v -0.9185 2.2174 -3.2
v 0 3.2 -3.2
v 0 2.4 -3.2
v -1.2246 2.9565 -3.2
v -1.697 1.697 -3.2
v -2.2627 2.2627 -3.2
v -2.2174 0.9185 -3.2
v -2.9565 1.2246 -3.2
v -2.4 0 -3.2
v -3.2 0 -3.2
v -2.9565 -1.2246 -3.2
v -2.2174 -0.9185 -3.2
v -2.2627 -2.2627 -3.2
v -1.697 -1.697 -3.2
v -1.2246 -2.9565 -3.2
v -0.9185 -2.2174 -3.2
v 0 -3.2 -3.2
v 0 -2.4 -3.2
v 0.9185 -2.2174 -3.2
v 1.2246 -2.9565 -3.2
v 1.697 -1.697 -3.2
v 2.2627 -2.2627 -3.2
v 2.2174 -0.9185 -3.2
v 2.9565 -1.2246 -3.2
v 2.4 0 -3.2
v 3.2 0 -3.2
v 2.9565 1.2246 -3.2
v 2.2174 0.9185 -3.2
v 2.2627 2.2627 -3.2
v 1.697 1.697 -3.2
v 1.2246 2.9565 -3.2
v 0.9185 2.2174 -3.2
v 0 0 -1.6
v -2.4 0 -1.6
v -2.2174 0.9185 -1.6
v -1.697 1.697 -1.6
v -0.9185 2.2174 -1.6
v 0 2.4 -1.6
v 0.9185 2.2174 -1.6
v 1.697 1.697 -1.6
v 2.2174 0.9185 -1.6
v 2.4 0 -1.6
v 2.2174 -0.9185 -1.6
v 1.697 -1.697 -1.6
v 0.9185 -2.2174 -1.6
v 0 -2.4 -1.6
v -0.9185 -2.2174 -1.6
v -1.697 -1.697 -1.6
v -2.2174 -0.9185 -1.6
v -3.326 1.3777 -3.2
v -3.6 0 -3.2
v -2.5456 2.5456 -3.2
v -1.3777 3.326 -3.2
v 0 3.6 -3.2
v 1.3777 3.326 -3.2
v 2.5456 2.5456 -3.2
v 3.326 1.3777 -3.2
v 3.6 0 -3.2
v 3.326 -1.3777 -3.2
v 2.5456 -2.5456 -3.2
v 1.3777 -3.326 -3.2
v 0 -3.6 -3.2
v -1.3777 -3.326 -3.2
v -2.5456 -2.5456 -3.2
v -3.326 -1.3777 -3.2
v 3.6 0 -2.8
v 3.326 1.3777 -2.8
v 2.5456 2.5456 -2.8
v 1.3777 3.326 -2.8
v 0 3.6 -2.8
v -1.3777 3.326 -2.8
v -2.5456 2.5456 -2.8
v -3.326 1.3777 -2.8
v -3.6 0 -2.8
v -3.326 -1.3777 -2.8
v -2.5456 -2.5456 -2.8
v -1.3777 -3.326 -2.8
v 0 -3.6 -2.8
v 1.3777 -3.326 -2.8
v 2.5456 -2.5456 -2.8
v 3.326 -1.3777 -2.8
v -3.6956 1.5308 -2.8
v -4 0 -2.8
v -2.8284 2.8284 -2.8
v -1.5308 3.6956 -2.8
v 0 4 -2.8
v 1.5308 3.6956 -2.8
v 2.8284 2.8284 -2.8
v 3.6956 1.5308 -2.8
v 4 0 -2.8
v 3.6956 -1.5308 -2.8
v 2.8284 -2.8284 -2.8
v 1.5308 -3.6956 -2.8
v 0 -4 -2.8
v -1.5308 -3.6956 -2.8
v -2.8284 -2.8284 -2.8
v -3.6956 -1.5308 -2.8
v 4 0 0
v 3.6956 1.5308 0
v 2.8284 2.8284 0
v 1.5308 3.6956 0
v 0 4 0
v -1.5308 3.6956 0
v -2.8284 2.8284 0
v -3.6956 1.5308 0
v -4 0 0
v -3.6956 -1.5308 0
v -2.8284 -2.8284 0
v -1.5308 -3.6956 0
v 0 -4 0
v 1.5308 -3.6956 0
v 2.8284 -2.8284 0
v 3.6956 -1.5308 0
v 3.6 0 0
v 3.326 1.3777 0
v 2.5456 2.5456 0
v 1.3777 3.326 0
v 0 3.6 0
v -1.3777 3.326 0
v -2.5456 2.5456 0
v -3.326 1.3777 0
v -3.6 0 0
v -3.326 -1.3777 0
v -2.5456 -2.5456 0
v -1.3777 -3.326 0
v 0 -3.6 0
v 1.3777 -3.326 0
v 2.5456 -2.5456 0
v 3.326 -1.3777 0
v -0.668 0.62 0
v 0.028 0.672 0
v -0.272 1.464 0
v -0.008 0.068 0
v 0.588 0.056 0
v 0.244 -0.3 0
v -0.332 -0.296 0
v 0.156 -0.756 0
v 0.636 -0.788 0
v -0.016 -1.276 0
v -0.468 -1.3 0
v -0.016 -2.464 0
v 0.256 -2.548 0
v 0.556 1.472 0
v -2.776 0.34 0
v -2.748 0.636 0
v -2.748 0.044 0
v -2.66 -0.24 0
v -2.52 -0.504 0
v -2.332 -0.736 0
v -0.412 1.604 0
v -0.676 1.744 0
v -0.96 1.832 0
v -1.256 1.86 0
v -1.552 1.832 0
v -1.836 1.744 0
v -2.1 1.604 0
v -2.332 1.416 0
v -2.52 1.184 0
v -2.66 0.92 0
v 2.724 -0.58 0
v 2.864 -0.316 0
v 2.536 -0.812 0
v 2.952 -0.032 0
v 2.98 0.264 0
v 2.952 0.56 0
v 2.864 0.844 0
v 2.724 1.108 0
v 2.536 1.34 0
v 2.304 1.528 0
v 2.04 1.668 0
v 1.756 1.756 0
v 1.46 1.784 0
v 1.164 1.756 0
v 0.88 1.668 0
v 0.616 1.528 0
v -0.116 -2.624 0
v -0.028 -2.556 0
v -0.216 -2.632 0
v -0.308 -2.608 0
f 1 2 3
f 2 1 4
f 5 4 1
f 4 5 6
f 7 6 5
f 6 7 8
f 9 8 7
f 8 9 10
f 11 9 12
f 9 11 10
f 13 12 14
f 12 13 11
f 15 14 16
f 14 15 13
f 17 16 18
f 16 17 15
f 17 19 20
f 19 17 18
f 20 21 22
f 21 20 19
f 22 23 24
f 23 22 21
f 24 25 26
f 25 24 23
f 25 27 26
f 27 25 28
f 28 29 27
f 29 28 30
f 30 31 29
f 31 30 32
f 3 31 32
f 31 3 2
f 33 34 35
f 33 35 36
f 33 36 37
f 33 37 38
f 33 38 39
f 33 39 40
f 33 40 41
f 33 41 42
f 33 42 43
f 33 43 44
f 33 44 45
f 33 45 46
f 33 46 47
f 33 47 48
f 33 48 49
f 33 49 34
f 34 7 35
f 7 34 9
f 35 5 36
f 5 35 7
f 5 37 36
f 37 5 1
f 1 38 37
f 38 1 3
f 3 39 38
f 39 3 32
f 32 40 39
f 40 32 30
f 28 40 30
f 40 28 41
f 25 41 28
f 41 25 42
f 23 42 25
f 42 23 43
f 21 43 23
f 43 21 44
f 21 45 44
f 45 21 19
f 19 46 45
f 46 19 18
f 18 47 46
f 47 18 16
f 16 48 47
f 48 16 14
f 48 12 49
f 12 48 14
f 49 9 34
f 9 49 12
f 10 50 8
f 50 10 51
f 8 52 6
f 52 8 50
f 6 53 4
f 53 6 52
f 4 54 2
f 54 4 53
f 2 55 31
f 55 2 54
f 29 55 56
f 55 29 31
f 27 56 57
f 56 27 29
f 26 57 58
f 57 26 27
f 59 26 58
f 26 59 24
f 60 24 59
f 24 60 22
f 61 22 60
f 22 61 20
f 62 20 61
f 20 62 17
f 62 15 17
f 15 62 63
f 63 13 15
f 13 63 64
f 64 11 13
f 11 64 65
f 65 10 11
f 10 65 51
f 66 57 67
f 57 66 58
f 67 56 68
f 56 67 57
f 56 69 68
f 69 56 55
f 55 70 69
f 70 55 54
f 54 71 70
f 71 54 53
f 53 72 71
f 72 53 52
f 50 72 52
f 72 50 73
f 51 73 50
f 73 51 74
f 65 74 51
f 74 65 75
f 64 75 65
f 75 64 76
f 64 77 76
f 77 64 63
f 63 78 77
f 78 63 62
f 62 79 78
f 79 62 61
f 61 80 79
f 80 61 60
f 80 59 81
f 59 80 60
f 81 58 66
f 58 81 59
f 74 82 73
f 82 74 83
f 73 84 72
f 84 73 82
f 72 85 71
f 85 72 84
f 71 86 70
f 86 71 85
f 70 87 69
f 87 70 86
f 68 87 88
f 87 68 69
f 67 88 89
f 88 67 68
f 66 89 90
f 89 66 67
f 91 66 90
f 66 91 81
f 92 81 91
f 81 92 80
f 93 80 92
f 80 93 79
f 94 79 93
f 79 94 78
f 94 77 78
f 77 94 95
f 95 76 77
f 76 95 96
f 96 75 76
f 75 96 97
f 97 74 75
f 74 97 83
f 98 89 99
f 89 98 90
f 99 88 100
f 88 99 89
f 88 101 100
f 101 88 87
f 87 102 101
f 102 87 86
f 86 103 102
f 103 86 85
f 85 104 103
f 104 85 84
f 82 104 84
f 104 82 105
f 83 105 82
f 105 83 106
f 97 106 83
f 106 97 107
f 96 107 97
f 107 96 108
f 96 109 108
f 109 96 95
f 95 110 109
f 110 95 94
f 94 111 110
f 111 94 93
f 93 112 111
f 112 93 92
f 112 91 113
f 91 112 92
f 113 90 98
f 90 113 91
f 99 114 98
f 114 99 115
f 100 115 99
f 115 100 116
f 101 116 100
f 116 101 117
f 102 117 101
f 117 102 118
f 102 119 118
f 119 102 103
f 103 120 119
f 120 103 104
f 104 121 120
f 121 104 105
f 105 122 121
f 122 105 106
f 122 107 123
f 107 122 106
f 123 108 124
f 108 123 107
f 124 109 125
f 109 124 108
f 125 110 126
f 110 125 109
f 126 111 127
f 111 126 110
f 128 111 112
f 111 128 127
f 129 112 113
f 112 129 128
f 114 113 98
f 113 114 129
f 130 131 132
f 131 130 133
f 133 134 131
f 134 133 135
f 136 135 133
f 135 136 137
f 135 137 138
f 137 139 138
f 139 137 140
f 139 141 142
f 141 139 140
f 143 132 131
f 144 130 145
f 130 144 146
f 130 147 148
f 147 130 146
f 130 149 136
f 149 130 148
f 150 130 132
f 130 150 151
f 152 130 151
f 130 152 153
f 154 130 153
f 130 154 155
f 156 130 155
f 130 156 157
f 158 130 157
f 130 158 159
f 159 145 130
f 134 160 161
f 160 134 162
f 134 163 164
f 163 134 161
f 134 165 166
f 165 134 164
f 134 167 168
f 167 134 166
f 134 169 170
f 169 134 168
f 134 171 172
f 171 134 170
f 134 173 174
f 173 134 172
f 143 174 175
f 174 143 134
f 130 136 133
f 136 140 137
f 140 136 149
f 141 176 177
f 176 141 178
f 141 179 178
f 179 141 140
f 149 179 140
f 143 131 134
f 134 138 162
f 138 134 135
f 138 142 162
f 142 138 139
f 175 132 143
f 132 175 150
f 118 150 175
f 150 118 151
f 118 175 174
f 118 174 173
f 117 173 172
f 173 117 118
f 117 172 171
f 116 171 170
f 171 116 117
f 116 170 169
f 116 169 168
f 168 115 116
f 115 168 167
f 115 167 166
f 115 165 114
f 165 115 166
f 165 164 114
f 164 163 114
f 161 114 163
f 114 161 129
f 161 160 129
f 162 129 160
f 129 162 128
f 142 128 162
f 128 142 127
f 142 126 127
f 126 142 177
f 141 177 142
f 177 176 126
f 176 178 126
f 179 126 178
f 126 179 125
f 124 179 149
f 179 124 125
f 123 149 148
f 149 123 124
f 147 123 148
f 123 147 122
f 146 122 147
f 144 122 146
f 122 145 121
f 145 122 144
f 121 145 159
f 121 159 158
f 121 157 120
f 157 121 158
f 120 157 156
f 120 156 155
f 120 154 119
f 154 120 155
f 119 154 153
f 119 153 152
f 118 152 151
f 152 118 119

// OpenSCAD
use <../lib.scad>
use <../p/4-4ering.scad>
use <s/98138s01.scad>
$fa=1; $fs=0.2;
function ldraw_lib__98138p1o(realsolid=false) = [
// 0 Tile  1 x  1 Round with Coral Broken Heart on Black Background Pattern
// 0 Name: 98138p1o.dat
// 0 Author: Gerald Lasser [GeraldLasser]
// 0 !LDRAW_ORG Part UPDATE 2022-04
// 0 !LICENSE Licensed under CC BY 2.0 and CC BY 4.0 : see CAreadme.txt
// 
// 0 BFC CERTIFY CCW
  [0,"BFC","CERTIFY"],
  [0,"BFC","CCW"],
// 
// 0 !KEYWORDS Creativity Box, Dots
// 
// 0 !HISTORY 2022-07-18 [PTadmin] Official Update 2022-04
// 
// 
// 1 16 0 0 0 1 0 0 0 1 0 0 0 1 s\98138s01.dat
  [1,16,0,0,0,1,0,0,0,1,0,0,0,1, ldraw_lib__s__98138s01(realsolid)],
// 1 0 0 0 0 9 0 0 0 1 0 0 0 9 4-4ering.dat
  [1,0,0,0,0,9,0,0,0,1,0,0,0,9, ldraw_lib__4_4ering(realsolid)],
// 4 0 .07 0 1.68 -.68 0 3.66 -1.67 0 1.55 -.02 0 .17
  [4,0,.07,0,1.68,-.68,0,3.66,-1.67,0,1.55,-.02,0,.17],
// 4 0 1.47 0 .14 .07 0 1.68 -.02 0 .17 .61 0 -.75
  [4,0,1.47,0,.14,.07,0,1.68,-.02,0,.17,.61,0,-.75],
// 4 0 .61 0 -.75 -.02 0 .17 -.83 0 -.74 .39 0 -1.89
  [4,0,.61,0,-.75,-.02,0,.17,-.83,0,-.74,.39,0,-1.89],
// 3 0 .61 0 -.75 .39 0 -1.89 1.59 0 -1.97
  [3,0,.61,0,-.75,.39,0,-1.89,1.59,0,-1.97],
// 4 0 -.04 0 -3.19 1.59 0 -1.97 .39 0 -1.89 -1.17 0 -3.25
  [4,0,-.04,0,-3.19,1.59,0,-1.97,.39,0,-1.89,-1.17,0,-3.25],
// 4 0 -.04 0 -3.19 -1.17 0 -3.25 -.04 0 -6.16 .64 0 -6.37
  [4,0,-.04,0,-3.19,-1.17,0,-3.25,-.04,0,-6.16,.64,0,-6.37],
// 3 0 1.39 0 3.68 -.68 0 3.66 .07 0 1.68
  [3,0,1.39,0,3.68,-.68,0,3.66,.07,0,1.68],
// 4 353 -1.67 0 1.55 -6.87 0 1.59 -6.94 0 .85 -6.87 0 .11
  [4,353,-1.67,0,1.55,-6.87,0,1.59,-6.94,0,.85,-6.87,0,.11],
// 4 353 -1.67 0 1.55 -6.87 0 .11 -6.65 0 -.6 -6.3 0 -1.26
  [4,353,-1.67,0,1.55,-6.87,0,.11,-6.65,0,-.6,-6.3,0,-1.26],
// 4 353 -1.67 0 1.55 -6.3 0 -1.26 -5.83 0 -1.84 -.83 0 -.74
  [4,353,-1.67,0,1.55,-6.3,0,-1.26,-5.83,0,-1.84,-.83,0,-.74],
// 4 353 -1.67 0 1.55 -.68 0 3.66 -1.03 0 4.01 -1.69 0 4.36
  [4,353,-1.67,0,1.55,-.68,0,3.66,-1.03,0,4.01,-1.69,0,4.36],
// 4 353 -1.67 0 1.55 -1.69 0 4.36 -2.4 0 4.58 -3.14 0 4.65
  [4,353,-1.67,0,1.55,-1.69,0,4.36,-2.4,0,4.58,-3.14,0,4.65],
// 4 353 -1.67 0 1.55 -3.14 0 4.65 -3.88 0 4.58 -4.59 0 4.36
  [4,353,-1.67,0,1.55,-3.14,0,4.65,-3.88,0,4.58,-4.59,0,4.36],
// 4 353 -1.67 0 1.55 -4.59 0 4.36 -5.25 0 4.01 -5.83 0 3.54
  [4,353,-1.67,0,1.55,-4.59,0,4.36,-5.25,0,4.01,-5.83,0,3.54],
// 4 353 -1.67 0 1.55 -5.83 0 3.54 -6.3 0 2.96 -6.65 0 2.3
  [4,353,-1.67,0,1.55,-5.83,0,3.54,-6.3,0,2.96,-6.65,0,2.3],
// 3 353 -6.65 0 2.3 -6.87 0 1.59 -1.67 0 1.55
  [3,353,-6.65,0,2.3,-6.87,0,1.59,-1.67,0,1.55],
// 4 353 1.47 0 .14 6.34 0 -2.03 6.81 0 -1.45 7.16 0 -.79
  [4,353,1.47,0,.14,6.34,0,-2.03,6.81,0,-1.45,7.16,0,-.79],
// 4 353 1.47 0 .14 7.16 0 -.79 7.38 0 -.08 7.45 0 .66
  [4,353,1.47,0,.14,7.16,0,-.79,7.38,0,-.08,7.45,0,.66],
// 4 353 1.47 0 .14 7.45 0 .66 7.38 0 1.4 7.16 0 2.11
  [4,353,1.47,0,.14,7.45,0,.66,7.38,0,1.4,7.16,0,2.11],
// 4 353 1.47 0 .14 7.16 0 2.11 6.81 0 2.77 6.34 0 3.35
  [4,353,1.47,0,.14,7.16,0,2.11,6.81,0,2.77,6.34,0,3.35],
// 4 353 1.47 0 .14 6.34 0 3.35 5.76 0 3.82 5.1 0 4.17
  [4,353,1.47,0,.14,6.34,0,3.35,5.76,0,3.82,5.1,0,4.17],
// 4 353 1.47 0 .14 5.1 0 4.17 4.39 0 4.39 3.65 0 4.46
  [4,353,1.47,0,.14,5.1,0,4.17,4.39,0,4.39,3.65,0,4.46],
// 4 353 1.47 0 .14 3.65 0 4.46 2.91 0 4.39 2.2 0 4.17
  [4,353,1.47,0,.14,3.65,0,4.46,2.91,0,4.39,2.2,0,4.17],
// 4 353 1.47 0 .14 2.2 0 4.17 1.54 0 3.82 1.39 0 3.68
  [4,353,1.47,0,.14,2.2,0,4.17,1.54,0,3.82,1.39,0,3.68],
// 3 353 -1.67 0 1.55 -.83 0 -.74 -.02 0 .17
  [3,353,-1.67,0,1.55,-.83,0,-.74,-.02,0,.17],
// 4 353 -.83 0 -.74 -5.83 0 -1.84 -1.17 0 -3.25 .39 0 -1.89
  [4,353,-.83,0,-.74,-5.83,0,-1.84,-1.17,0,-3.25,.39,0,-1.89],
// 4 353 -.29 0 -6.56 -.07 0 -6.39 -.04 0 -6.16 -.54 0 -6.58
  [4,353,-.29,0,-6.56,-.07,0,-6.39,-.04,0,-6.16,-.54,0,-6.58],
// 4 353 -.77 0 -6.52 -.54 0 -6.58 -.04 0 -6.16 -1.17 0 -3.25
  [4,353,-.77,0,-6.52,-.54,0,-6.58,-.04,0,-6.16,-1.17,0,-3.25],
// 3 353 -5.83 0 -1.84 -.77 0 -6.52 -1.17 0 -3.25
  [3,353,-5.83,0,-1.84,-.77,0,-6.52,-1.17,0,-3.25],
// 3 353 1.39 0 3.68 .07 0 1.68 1.47 0 .14
  [3,353,1.39,0,3.68,.07,0,1.68,1.47,0,.14],
// 4 353 1.47 0 .14 .61 0 -.75 1.59 0 -1.97 6.34 0 -2.03
  [4,353,1.47,0,.14,.61,0,-.75,1.59,0,-1.97,6.34,0,-2.03],
// 4 353 .64 0 -6.37 6.34 0 -2.03 1.59 0 -1.97 -.04 0 -3.19
  [4,353,.64,0,-6.37,6.34,0,-2.03,1.59,0,-1.97,-.04,0,-3.19],
// 4 0 -1.03 0 4.01 -.68 0 3.66 1.39 0 3.68 1.54 0 3.82
  [4,0,-1.03,0,4.01,-.68,0,3.66,1.39,0,3.68,1.54,0,3.82],
// 4 0 -1.69 0 4.36 -1.03 0 4.01 1.54 0 3.82 0 0 9
  [4,0,-1.69,0,4.36,-1.03,0,4.01,1.54,0,3.82,0,0,9],
// 3 0 0 0 9 1.54 0 3.82 2.2 0 4.17
  [3,0,0,0,9,1.54,0,3.82,2.2,0,4.17],
// 3 0 0 0 9 2.2 0 4.17 2.91 0 4.39
  [3,0,0,0,9,2.2,0,4.17,2.91,0,4.39],
// 4 0 0 0 9 2.91 0 4.39 3.65 0 4.46 3.4443 0 8.3151
  [4,0,0,0,9,2.91,0,4.39,3.65,0,4.46,3.4443,0,8.3151],
// 3 0 3.4443 0 8.3151 3.65 0 4.46 4.39 0 4.39
  [3,0,3.4443,0,8.3151,3.65,0,4.46,4.39,0,4.39],
// 4 0 3.4443 0 8.3151 4.39 0 4.39 5.1 0 4.17 6.3639 0 6.3639
  [4,0,3.4443,0,8.3151,4.39,0,4.39,5.1,0,4.17,6.3639,0,6.3639],
// 3 0 6.3639 0 6.3639 5.1 0 4.17 5.76 0 3.82
  [3,0,6.3639,0,6.3639,5.1,0,4.17,5.76,0,3.82],
// 3 0 6.3639 0 6.3639 5.76 0 3.82 6.34 0 3.35
  [3,0,6.3639,0,6.3639,5.76,0,3.82,6.34,0,3.35],
// 4 0 6.3639 0 6.3639 6.34 0 3.35 6.81 0 2.77 8.3151 0 3.4443
  [4,0,6.3639,0,6.3639,6.34,0,3.35,6.81,0,2.77,8.3151,0,3.4443],
// 3 0 8.3151 0 3.4443 6.81 0 2.77 7.16 0 2.11
  [3,0,8.3151,0,3.4443,6.81,0,2.77,7.16,0,2.11],
// 4 0 8.3151 0 3.4443 7.16 0 2.11 7.38 0 1.4 9 0 0
  [4,0,8.3151,0,3.4443,7.16,0,2.11,7.38,0,1.4,9,0,0],
// 3 0 7.38 0 1.4 7.45 0 .66 9 0 0
  [3,0,7.38,0,1.4,7.45,0,.66,9,0,0],
// 3 0 7.45 0 .66 7.38 0 -.08 9 0 0
  [3,0,7.45,0,.66,7.38,0,-.08,9,0,0],
// 4 0 9 0 0 7.38 0 -.08 7.16 0 -.79 8.3151 0 -3.4443
  [4,0,9,0,0,7.38,0,-.08,7.16,0,-.79,8.3151,0,-3.4443],
// 3 0 7.16 0 -.79 6.81 0 -1.45 8.3151 0 -3.4443
  [3,0,7.16,0,-.79,6.81,0,-1.45,8.3151,0,-3.4443],
// 4 0 8.3151 0 -3.4443 6.81 0 -1.45 6.34 0 -2.03 6.3639 0 -6.3639
  [4,0,8.3151,0,-3.4443,6.81,0,-1.45,6.34,0,-2.03,6.3639,0,-6.3639],
// 4 0 6.3639 0 -6.3639 6.34 0 -2.03 .64 0 -6.37 3.4443 0 -8.3151
  [4,0,6.3639,0,-6.3639,6.34,0,-2.03,.64,0,-6.37,3.4443,0,-8.3151],
// 4 0 0 0 -9 3.4443 0 -8.3151 .64 0 -6.37 -.07 0 -6.39
  [4,0,0,0,-9,3.4443,0,-8.3151,.64,0,-6.37,-.07,0,-6.39],
// 3 0 -.04 0 -6.16 -.07 0 -6.39 .64 0 -6.37
  [3,0,-.04,0,-6.16,-.07,0,-6.39,.64,0,-6.37],
// 3 0 -.07 0 -6.39 -.29 0 -6.56 0 0 -9
  [3,0,-.07,0,-6.39,-.29,0,-6.56,0,0,-9],
// 3 0 -.29 0 -6.56 -.54 0 -6.58 0 0 -9
  [3,0,-.29,0,-6.56,-.54,0,-6.58,0,0,-9],
// 4 0 0 0 -9 -.54 0 -6.58 -.77 0 -6.52 -3.4443 0 -8.3151
  [4,0,0,0,-9,-.54,0,-6.58,-.77,0,-6.52,-3.4443,0,-8.3151],
// 4 0 -6.3639 0 -6.3639 -3.4443 0 -8.3151 -.77 0 -6.52 -5.83 0 -1.84
  [4,0,-6.3639,0,-6.3639,-3.4443,0,-8.3151,-.77,0,-6.52,-5.83,0,-1.84],
// 4 0 -8.3151 0 -3.4443 -6.3639 0 -6.3639 -5.83 0 -1.84 -6.3 0 -1.26
  [4,0,-8.3151,0,-3.4443,-6.3639,0,-6.3639,-5.83,0,-1.84,-6.3,0,-1.26],
// 4 0 -8.3151 0 -3.4443 -6.3 0 -1.26 -6.65 0 -.6 -9 0 0
  [4,0,-8.3151,0,-3.4443,-6.3,0,-1.26,-6.65,0,-.6,-9,0,0],
// 3 0 -6.87 0 .11 -9 0 0 -6.65 0 -.6
  [3,0,-6.87,0,.11,-9,0,0,-6.65,0,-.6],
// 3 0 -6.94 0 .85 -9 0 0 -6.87 0 .11
  [3,0,-6.94,0,.85,-9,0,0,-6.87,0,.11],
// 4 0 -9 0 0 -6.94 0 .85 -6.87 0 1.59 -8.3151 0 3.4443
  [4,0,-9,0,0,-6.94,0,.85,-6.87,0,1.59,-8.3151,0,3.4443],
// 3 0 -8.3151 0 3.4443 -6.87 0 1.59 -6.65 0 2.3
  [3,0,-8.3151,0,3.4443,-6.87,0,1.59,-6.65,0,2.3],
// 3 0 -8.3151 0 3.4443 -6.65 0 2.3 -6.3 0 2.96
  [3,0,-8.3151,0,3.4443,-6.65,0,2.3,-6.3,0,2.96],
// 4 0 -8.3151 0 3.4443 -6.3 0 2.96 -5.83 0 3.54 -6.3639 0 6.3639
  [4,0,-8.3151,0,3.4443,-6.3,0,2.96,-5.83,0,3.54,-6.3639,0,6.3639],
// 3 0 -6.3639 0 6.3639 -5.83 0 3.54 -5.25 0 4.01
  [3,0,-6.3639,0,6.3639,-5.83,0,3.54,-5.25,0,4.01],
// 3 0 -6.3639 0 6.3639 -5.25 0 4.01 -4.59 0 4.36
  [3,0,-6.3639,0,6.3639,-5.25,0,4.01,-4.59,0,4.36],
// 4 0 -6.3639 0 6.3639 -4.59 0 4.36 -3.88 0 4.58 -3.4443 0 8.3151
  [4,0,-6.3639,0,6.3639,-4.59,0,4.36,-3.88,0,4.58,-3.4443,0,8.3151],
// 3 0 -3.4443 0 8.3151 -3.88 0 4.58 -3.14 0 4.65
  [3,0,-3.4443,0,8.3151,-3.88,0,4.58,-3.14,0,4.65],
// 3 0 -3.4443 0 8.3151 -3.14 0 4.65 -2.4 0 4.58
  [3,0,-3.4443,0,8.3151,-3.14,0,4.65,-2.4,0,4.58],
// 4 0 -3.4443 0 8.3151 -2.4 0 4.58 -1.69 0 4.36 0 0 9
  [4,0,-3.4443,0,8.3151,-2.4,0,4.58,-1.69,0,4.36,0,0,9],
];
module ldraw_lib__98138p1o(step=0, col=false, unit=2/5, alt=false, line=0.2, solid=!$preview)
    makepoly(ldraw_lib__98138p1o(solid), step=step, col=col, unit=unit, alt=alt, line=line, solid=solid);
ldraw_lib__98138p1o(line=0.2);
